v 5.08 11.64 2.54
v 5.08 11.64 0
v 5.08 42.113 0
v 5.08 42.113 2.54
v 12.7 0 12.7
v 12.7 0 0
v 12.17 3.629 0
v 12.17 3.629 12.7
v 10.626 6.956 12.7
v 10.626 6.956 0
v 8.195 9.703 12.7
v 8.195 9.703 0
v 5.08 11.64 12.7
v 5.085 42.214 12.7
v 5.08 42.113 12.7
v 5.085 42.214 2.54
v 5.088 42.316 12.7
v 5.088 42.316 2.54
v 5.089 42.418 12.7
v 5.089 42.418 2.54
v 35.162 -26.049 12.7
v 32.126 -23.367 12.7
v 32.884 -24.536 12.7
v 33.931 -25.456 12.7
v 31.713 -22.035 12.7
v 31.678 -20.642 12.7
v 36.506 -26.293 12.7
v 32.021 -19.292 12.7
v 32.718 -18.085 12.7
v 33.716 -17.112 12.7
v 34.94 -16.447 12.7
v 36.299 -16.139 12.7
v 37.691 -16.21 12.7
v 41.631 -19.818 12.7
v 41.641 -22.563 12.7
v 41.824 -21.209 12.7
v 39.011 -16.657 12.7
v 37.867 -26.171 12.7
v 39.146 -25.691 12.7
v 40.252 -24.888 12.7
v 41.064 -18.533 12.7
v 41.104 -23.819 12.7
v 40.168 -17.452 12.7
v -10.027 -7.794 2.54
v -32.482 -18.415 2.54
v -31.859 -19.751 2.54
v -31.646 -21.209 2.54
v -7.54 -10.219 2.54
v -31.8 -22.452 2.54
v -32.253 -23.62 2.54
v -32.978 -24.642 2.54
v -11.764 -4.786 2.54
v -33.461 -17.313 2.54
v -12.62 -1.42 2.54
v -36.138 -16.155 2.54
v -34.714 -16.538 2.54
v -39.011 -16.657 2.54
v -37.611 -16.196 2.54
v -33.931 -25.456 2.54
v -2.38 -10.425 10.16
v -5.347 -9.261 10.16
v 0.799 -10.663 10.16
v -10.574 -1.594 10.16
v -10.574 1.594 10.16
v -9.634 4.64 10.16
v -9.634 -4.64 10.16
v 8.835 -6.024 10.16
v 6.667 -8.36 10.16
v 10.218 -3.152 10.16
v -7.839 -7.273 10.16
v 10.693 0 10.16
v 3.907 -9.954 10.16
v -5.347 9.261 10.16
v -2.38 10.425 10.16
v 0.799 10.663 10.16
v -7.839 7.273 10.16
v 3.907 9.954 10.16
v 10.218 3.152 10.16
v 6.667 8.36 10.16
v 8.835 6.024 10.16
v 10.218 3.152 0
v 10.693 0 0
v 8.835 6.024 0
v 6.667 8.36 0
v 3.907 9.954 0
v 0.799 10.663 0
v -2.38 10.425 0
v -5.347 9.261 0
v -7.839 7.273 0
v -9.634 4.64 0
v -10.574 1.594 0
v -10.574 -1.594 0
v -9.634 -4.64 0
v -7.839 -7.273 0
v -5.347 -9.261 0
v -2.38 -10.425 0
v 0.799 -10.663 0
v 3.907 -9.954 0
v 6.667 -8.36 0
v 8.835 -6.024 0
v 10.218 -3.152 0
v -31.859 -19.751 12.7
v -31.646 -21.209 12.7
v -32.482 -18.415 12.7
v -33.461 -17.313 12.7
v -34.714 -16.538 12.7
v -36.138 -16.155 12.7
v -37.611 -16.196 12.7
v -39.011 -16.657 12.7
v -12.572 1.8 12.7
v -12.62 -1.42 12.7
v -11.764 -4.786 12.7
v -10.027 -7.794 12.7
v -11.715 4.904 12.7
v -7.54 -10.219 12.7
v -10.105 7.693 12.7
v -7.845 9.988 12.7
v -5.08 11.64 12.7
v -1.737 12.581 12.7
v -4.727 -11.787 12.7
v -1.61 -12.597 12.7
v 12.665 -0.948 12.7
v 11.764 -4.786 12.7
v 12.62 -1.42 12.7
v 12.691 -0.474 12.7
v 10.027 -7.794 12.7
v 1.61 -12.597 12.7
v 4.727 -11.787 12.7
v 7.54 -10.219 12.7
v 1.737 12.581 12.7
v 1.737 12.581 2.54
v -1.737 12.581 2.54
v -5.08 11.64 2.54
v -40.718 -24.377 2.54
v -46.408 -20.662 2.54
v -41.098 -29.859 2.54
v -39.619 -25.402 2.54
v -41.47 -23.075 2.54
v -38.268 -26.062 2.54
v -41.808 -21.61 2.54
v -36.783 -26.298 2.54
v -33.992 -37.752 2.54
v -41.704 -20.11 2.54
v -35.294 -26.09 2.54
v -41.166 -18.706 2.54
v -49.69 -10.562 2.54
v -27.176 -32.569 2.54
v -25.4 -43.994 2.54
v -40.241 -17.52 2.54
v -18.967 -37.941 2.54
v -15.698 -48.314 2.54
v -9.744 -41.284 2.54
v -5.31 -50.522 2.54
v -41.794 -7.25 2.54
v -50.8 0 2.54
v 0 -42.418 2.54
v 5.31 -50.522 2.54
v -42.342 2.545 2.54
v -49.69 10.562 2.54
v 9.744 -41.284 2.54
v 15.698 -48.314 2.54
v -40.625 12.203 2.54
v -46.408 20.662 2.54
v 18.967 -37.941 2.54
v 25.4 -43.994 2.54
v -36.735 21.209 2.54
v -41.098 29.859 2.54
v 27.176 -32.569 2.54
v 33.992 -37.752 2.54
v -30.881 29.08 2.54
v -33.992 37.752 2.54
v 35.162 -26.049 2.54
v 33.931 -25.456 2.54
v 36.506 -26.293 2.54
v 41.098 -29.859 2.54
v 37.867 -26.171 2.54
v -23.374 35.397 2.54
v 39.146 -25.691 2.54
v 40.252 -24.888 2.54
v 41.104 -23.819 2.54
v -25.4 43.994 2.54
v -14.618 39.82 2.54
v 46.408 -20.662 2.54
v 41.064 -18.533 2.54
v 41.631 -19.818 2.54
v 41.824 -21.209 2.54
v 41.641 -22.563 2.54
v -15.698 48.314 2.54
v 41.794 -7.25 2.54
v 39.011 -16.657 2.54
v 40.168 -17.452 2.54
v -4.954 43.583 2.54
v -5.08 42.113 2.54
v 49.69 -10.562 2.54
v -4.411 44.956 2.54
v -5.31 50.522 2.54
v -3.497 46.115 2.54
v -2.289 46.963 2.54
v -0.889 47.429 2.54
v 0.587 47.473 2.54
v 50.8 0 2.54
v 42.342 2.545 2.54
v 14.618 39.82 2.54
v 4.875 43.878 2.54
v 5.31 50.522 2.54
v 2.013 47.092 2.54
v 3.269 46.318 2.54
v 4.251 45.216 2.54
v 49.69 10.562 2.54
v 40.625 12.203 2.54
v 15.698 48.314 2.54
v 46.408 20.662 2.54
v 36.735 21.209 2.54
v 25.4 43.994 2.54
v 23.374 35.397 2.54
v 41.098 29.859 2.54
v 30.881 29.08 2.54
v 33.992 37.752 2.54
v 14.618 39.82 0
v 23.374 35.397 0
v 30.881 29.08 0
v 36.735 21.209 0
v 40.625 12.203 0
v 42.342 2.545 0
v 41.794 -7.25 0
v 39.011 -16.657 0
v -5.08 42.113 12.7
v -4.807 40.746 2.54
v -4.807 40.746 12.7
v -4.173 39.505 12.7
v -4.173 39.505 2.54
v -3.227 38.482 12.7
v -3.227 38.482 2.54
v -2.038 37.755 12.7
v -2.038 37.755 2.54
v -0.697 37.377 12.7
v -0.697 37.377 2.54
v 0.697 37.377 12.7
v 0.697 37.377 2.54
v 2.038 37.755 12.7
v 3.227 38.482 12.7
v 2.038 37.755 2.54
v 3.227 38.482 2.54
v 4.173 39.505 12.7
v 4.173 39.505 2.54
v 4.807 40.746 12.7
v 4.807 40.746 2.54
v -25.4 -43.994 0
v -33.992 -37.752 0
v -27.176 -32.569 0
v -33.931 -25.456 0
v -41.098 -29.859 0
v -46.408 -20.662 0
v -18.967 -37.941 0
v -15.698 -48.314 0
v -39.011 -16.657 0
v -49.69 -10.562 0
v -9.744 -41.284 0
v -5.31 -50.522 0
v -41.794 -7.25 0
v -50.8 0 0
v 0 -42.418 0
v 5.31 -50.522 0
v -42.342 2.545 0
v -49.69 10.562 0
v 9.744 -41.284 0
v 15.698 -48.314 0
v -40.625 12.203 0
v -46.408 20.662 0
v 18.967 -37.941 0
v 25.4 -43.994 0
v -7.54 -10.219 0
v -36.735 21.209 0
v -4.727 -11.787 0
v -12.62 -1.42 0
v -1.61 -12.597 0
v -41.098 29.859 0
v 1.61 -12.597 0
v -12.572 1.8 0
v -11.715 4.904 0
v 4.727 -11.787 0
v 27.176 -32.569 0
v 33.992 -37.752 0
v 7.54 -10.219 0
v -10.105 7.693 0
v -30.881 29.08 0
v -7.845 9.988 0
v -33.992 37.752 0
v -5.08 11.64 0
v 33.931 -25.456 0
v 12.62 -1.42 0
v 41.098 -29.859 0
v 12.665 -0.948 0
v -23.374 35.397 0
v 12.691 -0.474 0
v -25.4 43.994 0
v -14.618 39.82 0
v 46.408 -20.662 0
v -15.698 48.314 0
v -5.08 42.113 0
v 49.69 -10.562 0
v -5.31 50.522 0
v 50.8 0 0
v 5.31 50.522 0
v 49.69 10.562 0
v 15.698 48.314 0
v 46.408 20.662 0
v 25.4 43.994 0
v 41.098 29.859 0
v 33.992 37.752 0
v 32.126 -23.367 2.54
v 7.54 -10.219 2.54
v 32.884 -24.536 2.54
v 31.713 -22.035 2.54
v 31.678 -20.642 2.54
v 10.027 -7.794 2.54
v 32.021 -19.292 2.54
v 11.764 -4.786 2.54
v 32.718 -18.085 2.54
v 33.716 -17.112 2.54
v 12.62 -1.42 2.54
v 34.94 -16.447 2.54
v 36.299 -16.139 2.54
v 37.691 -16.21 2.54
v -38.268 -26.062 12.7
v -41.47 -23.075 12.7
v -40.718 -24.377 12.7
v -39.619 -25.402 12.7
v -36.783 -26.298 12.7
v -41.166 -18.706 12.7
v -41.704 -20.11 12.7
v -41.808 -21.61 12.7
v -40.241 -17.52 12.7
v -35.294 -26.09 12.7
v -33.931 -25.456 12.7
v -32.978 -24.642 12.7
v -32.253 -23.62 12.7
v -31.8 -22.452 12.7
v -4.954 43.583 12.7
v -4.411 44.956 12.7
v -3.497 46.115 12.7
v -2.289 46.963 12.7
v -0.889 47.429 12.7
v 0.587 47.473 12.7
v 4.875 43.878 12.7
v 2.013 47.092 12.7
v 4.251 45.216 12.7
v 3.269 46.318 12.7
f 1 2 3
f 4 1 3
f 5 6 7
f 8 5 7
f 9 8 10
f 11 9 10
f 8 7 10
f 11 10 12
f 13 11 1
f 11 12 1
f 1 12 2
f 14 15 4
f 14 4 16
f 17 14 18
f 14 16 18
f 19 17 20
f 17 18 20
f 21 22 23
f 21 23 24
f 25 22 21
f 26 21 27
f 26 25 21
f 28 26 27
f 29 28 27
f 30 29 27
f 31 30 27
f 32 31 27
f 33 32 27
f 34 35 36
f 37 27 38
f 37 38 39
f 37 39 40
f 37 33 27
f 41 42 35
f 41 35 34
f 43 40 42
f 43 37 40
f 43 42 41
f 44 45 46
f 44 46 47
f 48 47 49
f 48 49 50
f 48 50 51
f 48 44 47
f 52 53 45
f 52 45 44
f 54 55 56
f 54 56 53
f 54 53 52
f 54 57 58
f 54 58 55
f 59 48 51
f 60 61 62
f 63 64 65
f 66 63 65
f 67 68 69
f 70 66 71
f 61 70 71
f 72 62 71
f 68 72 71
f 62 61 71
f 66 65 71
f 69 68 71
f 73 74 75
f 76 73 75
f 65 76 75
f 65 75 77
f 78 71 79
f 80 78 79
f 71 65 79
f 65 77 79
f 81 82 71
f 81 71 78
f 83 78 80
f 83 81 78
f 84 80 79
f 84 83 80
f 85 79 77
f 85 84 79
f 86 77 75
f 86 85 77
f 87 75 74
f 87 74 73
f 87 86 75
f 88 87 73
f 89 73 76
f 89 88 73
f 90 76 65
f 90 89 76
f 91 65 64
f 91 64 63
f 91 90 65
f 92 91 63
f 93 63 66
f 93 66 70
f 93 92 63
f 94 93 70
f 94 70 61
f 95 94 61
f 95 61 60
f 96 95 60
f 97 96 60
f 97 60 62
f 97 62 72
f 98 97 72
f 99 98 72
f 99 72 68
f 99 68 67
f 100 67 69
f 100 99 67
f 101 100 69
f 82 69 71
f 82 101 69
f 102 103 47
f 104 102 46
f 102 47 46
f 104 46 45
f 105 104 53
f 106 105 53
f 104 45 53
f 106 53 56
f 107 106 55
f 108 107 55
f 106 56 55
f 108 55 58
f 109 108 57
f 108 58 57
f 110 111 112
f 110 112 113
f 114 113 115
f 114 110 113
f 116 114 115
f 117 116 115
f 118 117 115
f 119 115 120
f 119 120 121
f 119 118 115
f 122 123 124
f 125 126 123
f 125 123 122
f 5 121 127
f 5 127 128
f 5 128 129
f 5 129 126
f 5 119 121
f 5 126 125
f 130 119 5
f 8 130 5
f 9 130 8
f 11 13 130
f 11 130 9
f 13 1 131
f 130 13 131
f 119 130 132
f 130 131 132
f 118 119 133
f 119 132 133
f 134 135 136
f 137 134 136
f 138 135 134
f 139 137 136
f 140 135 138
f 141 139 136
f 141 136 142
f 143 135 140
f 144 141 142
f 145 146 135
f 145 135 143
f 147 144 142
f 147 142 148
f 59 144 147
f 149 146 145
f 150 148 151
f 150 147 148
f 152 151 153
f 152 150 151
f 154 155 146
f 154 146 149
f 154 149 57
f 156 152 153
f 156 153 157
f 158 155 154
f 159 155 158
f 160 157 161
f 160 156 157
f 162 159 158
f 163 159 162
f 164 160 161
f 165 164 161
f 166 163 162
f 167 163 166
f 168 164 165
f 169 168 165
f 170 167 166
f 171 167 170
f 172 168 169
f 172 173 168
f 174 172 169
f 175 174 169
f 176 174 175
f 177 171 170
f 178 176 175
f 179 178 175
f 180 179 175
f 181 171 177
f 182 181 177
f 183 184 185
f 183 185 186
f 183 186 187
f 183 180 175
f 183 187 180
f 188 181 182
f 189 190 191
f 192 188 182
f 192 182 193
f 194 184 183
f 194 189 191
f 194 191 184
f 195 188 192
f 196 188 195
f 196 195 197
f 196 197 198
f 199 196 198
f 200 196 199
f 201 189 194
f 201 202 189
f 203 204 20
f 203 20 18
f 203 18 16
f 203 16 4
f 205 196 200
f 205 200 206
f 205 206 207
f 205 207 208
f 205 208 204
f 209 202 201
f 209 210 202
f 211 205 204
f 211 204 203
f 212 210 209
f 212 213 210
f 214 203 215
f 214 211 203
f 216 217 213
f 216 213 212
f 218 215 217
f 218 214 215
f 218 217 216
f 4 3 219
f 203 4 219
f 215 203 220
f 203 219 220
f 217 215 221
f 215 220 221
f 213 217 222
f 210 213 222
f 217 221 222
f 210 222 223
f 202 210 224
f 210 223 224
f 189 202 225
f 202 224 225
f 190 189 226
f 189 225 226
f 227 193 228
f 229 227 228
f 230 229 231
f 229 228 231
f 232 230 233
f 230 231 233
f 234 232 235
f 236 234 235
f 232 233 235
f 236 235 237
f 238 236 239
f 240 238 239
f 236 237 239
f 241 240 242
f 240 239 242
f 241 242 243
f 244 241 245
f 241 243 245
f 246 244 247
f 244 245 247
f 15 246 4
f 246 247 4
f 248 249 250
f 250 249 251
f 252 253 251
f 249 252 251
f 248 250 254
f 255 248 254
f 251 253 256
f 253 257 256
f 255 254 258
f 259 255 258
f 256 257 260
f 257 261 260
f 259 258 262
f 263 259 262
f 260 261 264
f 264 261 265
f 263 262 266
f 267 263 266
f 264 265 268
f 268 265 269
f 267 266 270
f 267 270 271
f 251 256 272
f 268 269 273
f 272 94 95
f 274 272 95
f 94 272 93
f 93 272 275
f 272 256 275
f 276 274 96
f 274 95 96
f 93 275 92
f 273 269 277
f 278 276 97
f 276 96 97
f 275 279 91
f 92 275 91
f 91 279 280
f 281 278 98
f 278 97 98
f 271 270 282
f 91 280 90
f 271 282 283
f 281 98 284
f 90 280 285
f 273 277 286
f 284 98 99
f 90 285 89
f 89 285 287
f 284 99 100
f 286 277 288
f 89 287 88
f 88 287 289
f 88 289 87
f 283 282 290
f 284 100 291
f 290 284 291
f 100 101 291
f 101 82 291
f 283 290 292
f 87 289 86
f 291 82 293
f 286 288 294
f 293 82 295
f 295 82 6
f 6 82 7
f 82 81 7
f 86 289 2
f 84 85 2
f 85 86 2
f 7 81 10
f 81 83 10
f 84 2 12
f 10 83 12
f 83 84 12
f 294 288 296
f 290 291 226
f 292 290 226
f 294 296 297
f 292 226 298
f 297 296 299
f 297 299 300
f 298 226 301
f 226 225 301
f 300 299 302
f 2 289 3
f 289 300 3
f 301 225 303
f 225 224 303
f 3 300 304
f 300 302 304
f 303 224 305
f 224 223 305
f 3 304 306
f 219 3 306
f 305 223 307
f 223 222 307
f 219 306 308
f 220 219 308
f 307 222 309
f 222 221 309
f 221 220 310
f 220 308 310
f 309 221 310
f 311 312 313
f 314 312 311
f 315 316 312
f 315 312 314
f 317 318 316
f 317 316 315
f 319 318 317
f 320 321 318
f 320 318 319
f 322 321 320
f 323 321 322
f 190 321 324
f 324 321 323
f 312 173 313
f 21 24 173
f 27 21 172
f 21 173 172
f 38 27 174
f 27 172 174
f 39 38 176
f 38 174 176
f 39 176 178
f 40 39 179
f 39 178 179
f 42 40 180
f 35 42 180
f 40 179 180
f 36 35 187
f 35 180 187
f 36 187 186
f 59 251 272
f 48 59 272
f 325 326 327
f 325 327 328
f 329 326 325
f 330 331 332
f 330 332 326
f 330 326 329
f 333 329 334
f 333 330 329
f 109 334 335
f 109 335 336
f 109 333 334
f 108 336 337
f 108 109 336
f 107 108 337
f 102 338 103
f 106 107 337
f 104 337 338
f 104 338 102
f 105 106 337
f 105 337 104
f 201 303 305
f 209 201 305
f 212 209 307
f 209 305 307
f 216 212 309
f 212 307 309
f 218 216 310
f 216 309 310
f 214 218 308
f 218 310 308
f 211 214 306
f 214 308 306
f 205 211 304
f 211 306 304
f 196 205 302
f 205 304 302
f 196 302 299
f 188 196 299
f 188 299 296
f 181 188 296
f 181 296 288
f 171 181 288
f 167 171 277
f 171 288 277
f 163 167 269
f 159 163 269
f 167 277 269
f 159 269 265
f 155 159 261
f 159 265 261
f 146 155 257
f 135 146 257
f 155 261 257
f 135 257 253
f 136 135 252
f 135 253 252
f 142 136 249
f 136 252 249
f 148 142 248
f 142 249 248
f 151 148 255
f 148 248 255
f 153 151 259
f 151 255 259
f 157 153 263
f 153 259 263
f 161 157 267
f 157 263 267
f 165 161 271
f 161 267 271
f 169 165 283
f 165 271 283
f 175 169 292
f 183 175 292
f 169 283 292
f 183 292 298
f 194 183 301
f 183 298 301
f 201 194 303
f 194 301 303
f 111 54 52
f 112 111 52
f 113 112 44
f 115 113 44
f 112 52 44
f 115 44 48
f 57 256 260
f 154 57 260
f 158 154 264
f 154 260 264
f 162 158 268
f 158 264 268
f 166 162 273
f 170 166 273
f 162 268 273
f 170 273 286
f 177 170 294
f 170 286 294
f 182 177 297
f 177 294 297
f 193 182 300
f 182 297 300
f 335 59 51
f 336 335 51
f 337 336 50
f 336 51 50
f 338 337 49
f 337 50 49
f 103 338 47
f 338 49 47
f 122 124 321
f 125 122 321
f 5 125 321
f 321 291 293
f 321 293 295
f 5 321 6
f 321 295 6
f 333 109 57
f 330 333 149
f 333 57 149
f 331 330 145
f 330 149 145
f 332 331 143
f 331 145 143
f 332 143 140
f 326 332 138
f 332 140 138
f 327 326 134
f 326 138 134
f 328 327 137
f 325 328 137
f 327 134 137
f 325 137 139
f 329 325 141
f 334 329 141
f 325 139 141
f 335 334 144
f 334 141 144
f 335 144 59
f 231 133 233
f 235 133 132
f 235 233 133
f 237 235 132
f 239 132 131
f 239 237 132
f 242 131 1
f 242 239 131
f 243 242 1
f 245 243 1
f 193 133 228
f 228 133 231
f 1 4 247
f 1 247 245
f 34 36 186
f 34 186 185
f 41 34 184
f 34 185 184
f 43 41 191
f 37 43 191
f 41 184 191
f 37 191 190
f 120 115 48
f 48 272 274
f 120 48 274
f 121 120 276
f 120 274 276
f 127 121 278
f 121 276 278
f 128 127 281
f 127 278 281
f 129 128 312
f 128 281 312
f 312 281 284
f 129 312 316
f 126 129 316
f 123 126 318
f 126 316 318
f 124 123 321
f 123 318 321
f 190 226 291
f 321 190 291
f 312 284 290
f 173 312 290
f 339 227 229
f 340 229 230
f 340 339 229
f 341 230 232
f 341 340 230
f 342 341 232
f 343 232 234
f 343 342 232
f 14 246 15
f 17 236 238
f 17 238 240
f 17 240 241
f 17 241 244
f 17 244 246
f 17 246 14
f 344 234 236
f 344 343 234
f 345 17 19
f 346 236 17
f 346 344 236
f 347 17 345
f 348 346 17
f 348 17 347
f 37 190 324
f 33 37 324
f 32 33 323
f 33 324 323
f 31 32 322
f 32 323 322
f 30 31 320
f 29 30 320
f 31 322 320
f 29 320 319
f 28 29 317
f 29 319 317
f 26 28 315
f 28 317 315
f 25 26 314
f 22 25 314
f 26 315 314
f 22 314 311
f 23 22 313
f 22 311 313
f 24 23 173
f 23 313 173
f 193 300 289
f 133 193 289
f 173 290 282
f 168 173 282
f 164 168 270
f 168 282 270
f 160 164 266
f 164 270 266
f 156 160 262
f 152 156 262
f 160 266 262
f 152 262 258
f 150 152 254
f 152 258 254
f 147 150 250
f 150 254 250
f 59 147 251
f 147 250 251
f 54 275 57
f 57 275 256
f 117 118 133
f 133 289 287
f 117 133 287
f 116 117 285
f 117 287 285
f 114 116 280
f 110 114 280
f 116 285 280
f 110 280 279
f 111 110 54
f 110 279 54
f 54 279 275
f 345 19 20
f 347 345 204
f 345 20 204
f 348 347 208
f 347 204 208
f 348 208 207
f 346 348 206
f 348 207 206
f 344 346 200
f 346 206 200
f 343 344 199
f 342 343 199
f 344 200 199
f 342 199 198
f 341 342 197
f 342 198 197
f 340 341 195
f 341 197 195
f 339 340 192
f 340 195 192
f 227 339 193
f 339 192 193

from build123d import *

# Parameters (mm, degrees)
F1_DEPTH = 2.54
F0_R     = 50.8
F2_DEPTH = 12.7
F3_R     = 10.6934
F4_DEPTH = 10.16


with BuildPart() as f1:
    # F0 (on Top) → F1 (new body)
    with BuildSketch(Plane.XY):
        with BuildLine():
            ThreePointArc((-7.5403124952, -10.2192801838), (-10.9985226281, -6.35), (-12.6203124952, -1.4204620814))
            Line((-12.6203124952, -1.4204620814), (-39.0106764813, -16.6569458328))
            ThreePointArc((-39.0106764812, -16.6569458328), (-34.0593747907, -16.8799953872), (-31.6459004079, -21.209))
            ThreePointArc((-31.6459004079, -21.209), (-32.2533470771, -23.6201825743), (-33.9306764813, -25.4557639352))
            Line((-33.9306764813, -25.4557639352), (-7.5403124952, -10.2192801838))
        make_face()
    extrude(amount=F1_DEPTH)



with BuildPart() as f1b:
    # F0 (on Top) → F1, piece 2 (new body)
    with BuildSketch(Plane.XY):
        Circle(F0_R)
        with BuildLine():
            ThreePointArc((-39.0106764812, -16.6569458328), (-36.7350655777, 21.209), (-5.08, 42.112709768))
            ThreePointArc((-5.08, 42.112709768), (-0.1527138878, 47.5048733613), (5.0891651698, 42.418))
            ThreePointArc((5.0891651698, 42.418), (5.0868733613, 42.2652861122), (5.08, 42.112709768))
            ThreePointArc((5.08, 42.112709768), (36.7350655777, 21.209), (39.0106764812, -16.6569458328))
            ThreePointArc((39.0106764813, -16.6569458328), (41.0640701906, -18.533309213), (41.8242307476, -21.209))
            ThreePointArc((41.8242307476, -21.209), (39.146248152, -25.6907185007), (33.9306764812, -25.4557639352))
            ThreePointArc((33.9306764812, -25.4557639352), (0, -42.418), (-33.9306764812, -25.4557639352))
            ThreePointArc((-33.9306764813, -25.4557639352), (-41.1424118989, -23.7535825849), (-39.0106764812, -16.6569458328))
        make_face(mode=Mode.SUBTRACT)
    extrude(amount=F1_DEPTH)


with BuildPart() as f1c:
    # F0 (on Top) → F1, piece 3 (new body)
    with BuildSketch(Plane.XY):
        with BuildLine():
            ThreePointArc((33.9306764812, -25.4557639352), (32.3277192566, -18.6644174151), (39.0106764813, -16.6569458328))
            Line((39.0106764813, -16.6569458328), (12.6203124952, -1.4204620814))
            ThreePointArc((12.6203124952, -1.4204620814), (10.9985226281, -6.35), (7.5403124952, -10.2192801838))
            Line((7.5403124952, -10.2192801838), (33.9306764812, -25.4557639352))
        make_face()
    extrude(amount=F1_DEPTH)


with BuildPart() as f1d:
    # F0 (on Top) → F1, piece 4 (new body)
    with BuildSketch(Plane.XY):
        with BuildLine():
            Line((-5.08, 42.112709768), (-5.08, 11.6397422652))
            ThreePointArc((-5.08, 11.6397422652), (0, 12.7), (5.08, 11.6397422652))
            Line((5.08, 11.6397422652), (5.08, 42.112709768))
            ThreePointArc((5.08, 42.112709768), (0, 37.3288348302), (-5.08, 42.112709768))
        make_face()
    extrude(amount=F1_DEPTH)


with BuildPart() as f1_1:
    add(f1.part)

    add(f1b.part)  # F2 merges F1b

    add(f1c.part)  # F2 merges F1c

    add(f1d.part)  # F2 merges F1d
    # F0 (on Top) → F2 (join)
    with BuildSketch(Plane.XY):
        with BuildLine():
            ThreePointArc((5.08, 11.6397422652), (0, 12.7), (-5.08, 11.6397422652))
            ThreePointArc((-5.08, 11.6397422652), (-10.9985226281, 6.35), (-12.6203124952, -1.4204620814))
            ThreePointArc((-12.6203124952, -1.4204620814), (-10.9985226281, -6.35), (-7.5403124952, -10.2192801838))
            ThreePointArc((-7.5403124952, -10.2192801838), (0, -12.7), (7.5403124952, -10.2192801838))
            ThreePointArc((7.5403124952, -10.2192801838), (10.9985226281, -6.35), (12.6203124952, -1.4204620814))
            ThreePointArc((12.6203124952, -1.4204620814), (12.680062474, -0.7113477741), (12.7, 0))
            ThreePointArc((12.7, 0), (10.625582337, 6.9560764803), (5.08, 11.6397422652))
        make_face()
        with BuildLine():
            ThreePointArc((-31.6459004079, -21.209), (-34.0593747907, -16.8799953872), (-39.0106764812, -16.6569458328))
            ThreePointArc((-39.0106764812, -16.6569458328), (-41.1424118989, -23.7535825849), (-33.9306764813, -25.4557639352))
            ThreePointArc((-33.9306764813, -25.4557639352), (-32.2533470771, -23.6201825743), (-31.6459004079, -21.209))
        make_face()
        with BuildLine():
            ThreePointArc((41.8242307476, -21.209), (41.0640701906, -18.533309213), (39.0106764813, -16.6569458328))
            ThreePointArc((39.0106764813, -16.6569458328), (32.3277192566, -18.6644174151), (33.9306764812, -25.4557639352))
            ThreePointArc((33.9306764812, -25.4557639352), (39.146248152, -25.6907185007), (41.8242307476, -21.209))
        make_face()
        with BuildLine():
            ThreePointArc((5.0891651698, 42.418), (-0.1527138878, 47.5048733613), (-5.08, 42.112709768))
            ThreePointArc((-5.08, 42.112709768), (0, 37.3288348302), (5.08, 42.112709768))
            ThreePointArc((5.08, 42.112709768), (5.0868733613, 42.2652861122), (5.0891651698, 42.418))
        make_face()
    extrude(amount=F2_DEPTH)

    # F3 (on face) → F4 (cut)
    with BuildSketch(Plane.XY):
        Circle(F3_R)
    extrude(amount=F4_DEPTH, mode=Mode.SUBTRACT)


solid = f1_1.part
